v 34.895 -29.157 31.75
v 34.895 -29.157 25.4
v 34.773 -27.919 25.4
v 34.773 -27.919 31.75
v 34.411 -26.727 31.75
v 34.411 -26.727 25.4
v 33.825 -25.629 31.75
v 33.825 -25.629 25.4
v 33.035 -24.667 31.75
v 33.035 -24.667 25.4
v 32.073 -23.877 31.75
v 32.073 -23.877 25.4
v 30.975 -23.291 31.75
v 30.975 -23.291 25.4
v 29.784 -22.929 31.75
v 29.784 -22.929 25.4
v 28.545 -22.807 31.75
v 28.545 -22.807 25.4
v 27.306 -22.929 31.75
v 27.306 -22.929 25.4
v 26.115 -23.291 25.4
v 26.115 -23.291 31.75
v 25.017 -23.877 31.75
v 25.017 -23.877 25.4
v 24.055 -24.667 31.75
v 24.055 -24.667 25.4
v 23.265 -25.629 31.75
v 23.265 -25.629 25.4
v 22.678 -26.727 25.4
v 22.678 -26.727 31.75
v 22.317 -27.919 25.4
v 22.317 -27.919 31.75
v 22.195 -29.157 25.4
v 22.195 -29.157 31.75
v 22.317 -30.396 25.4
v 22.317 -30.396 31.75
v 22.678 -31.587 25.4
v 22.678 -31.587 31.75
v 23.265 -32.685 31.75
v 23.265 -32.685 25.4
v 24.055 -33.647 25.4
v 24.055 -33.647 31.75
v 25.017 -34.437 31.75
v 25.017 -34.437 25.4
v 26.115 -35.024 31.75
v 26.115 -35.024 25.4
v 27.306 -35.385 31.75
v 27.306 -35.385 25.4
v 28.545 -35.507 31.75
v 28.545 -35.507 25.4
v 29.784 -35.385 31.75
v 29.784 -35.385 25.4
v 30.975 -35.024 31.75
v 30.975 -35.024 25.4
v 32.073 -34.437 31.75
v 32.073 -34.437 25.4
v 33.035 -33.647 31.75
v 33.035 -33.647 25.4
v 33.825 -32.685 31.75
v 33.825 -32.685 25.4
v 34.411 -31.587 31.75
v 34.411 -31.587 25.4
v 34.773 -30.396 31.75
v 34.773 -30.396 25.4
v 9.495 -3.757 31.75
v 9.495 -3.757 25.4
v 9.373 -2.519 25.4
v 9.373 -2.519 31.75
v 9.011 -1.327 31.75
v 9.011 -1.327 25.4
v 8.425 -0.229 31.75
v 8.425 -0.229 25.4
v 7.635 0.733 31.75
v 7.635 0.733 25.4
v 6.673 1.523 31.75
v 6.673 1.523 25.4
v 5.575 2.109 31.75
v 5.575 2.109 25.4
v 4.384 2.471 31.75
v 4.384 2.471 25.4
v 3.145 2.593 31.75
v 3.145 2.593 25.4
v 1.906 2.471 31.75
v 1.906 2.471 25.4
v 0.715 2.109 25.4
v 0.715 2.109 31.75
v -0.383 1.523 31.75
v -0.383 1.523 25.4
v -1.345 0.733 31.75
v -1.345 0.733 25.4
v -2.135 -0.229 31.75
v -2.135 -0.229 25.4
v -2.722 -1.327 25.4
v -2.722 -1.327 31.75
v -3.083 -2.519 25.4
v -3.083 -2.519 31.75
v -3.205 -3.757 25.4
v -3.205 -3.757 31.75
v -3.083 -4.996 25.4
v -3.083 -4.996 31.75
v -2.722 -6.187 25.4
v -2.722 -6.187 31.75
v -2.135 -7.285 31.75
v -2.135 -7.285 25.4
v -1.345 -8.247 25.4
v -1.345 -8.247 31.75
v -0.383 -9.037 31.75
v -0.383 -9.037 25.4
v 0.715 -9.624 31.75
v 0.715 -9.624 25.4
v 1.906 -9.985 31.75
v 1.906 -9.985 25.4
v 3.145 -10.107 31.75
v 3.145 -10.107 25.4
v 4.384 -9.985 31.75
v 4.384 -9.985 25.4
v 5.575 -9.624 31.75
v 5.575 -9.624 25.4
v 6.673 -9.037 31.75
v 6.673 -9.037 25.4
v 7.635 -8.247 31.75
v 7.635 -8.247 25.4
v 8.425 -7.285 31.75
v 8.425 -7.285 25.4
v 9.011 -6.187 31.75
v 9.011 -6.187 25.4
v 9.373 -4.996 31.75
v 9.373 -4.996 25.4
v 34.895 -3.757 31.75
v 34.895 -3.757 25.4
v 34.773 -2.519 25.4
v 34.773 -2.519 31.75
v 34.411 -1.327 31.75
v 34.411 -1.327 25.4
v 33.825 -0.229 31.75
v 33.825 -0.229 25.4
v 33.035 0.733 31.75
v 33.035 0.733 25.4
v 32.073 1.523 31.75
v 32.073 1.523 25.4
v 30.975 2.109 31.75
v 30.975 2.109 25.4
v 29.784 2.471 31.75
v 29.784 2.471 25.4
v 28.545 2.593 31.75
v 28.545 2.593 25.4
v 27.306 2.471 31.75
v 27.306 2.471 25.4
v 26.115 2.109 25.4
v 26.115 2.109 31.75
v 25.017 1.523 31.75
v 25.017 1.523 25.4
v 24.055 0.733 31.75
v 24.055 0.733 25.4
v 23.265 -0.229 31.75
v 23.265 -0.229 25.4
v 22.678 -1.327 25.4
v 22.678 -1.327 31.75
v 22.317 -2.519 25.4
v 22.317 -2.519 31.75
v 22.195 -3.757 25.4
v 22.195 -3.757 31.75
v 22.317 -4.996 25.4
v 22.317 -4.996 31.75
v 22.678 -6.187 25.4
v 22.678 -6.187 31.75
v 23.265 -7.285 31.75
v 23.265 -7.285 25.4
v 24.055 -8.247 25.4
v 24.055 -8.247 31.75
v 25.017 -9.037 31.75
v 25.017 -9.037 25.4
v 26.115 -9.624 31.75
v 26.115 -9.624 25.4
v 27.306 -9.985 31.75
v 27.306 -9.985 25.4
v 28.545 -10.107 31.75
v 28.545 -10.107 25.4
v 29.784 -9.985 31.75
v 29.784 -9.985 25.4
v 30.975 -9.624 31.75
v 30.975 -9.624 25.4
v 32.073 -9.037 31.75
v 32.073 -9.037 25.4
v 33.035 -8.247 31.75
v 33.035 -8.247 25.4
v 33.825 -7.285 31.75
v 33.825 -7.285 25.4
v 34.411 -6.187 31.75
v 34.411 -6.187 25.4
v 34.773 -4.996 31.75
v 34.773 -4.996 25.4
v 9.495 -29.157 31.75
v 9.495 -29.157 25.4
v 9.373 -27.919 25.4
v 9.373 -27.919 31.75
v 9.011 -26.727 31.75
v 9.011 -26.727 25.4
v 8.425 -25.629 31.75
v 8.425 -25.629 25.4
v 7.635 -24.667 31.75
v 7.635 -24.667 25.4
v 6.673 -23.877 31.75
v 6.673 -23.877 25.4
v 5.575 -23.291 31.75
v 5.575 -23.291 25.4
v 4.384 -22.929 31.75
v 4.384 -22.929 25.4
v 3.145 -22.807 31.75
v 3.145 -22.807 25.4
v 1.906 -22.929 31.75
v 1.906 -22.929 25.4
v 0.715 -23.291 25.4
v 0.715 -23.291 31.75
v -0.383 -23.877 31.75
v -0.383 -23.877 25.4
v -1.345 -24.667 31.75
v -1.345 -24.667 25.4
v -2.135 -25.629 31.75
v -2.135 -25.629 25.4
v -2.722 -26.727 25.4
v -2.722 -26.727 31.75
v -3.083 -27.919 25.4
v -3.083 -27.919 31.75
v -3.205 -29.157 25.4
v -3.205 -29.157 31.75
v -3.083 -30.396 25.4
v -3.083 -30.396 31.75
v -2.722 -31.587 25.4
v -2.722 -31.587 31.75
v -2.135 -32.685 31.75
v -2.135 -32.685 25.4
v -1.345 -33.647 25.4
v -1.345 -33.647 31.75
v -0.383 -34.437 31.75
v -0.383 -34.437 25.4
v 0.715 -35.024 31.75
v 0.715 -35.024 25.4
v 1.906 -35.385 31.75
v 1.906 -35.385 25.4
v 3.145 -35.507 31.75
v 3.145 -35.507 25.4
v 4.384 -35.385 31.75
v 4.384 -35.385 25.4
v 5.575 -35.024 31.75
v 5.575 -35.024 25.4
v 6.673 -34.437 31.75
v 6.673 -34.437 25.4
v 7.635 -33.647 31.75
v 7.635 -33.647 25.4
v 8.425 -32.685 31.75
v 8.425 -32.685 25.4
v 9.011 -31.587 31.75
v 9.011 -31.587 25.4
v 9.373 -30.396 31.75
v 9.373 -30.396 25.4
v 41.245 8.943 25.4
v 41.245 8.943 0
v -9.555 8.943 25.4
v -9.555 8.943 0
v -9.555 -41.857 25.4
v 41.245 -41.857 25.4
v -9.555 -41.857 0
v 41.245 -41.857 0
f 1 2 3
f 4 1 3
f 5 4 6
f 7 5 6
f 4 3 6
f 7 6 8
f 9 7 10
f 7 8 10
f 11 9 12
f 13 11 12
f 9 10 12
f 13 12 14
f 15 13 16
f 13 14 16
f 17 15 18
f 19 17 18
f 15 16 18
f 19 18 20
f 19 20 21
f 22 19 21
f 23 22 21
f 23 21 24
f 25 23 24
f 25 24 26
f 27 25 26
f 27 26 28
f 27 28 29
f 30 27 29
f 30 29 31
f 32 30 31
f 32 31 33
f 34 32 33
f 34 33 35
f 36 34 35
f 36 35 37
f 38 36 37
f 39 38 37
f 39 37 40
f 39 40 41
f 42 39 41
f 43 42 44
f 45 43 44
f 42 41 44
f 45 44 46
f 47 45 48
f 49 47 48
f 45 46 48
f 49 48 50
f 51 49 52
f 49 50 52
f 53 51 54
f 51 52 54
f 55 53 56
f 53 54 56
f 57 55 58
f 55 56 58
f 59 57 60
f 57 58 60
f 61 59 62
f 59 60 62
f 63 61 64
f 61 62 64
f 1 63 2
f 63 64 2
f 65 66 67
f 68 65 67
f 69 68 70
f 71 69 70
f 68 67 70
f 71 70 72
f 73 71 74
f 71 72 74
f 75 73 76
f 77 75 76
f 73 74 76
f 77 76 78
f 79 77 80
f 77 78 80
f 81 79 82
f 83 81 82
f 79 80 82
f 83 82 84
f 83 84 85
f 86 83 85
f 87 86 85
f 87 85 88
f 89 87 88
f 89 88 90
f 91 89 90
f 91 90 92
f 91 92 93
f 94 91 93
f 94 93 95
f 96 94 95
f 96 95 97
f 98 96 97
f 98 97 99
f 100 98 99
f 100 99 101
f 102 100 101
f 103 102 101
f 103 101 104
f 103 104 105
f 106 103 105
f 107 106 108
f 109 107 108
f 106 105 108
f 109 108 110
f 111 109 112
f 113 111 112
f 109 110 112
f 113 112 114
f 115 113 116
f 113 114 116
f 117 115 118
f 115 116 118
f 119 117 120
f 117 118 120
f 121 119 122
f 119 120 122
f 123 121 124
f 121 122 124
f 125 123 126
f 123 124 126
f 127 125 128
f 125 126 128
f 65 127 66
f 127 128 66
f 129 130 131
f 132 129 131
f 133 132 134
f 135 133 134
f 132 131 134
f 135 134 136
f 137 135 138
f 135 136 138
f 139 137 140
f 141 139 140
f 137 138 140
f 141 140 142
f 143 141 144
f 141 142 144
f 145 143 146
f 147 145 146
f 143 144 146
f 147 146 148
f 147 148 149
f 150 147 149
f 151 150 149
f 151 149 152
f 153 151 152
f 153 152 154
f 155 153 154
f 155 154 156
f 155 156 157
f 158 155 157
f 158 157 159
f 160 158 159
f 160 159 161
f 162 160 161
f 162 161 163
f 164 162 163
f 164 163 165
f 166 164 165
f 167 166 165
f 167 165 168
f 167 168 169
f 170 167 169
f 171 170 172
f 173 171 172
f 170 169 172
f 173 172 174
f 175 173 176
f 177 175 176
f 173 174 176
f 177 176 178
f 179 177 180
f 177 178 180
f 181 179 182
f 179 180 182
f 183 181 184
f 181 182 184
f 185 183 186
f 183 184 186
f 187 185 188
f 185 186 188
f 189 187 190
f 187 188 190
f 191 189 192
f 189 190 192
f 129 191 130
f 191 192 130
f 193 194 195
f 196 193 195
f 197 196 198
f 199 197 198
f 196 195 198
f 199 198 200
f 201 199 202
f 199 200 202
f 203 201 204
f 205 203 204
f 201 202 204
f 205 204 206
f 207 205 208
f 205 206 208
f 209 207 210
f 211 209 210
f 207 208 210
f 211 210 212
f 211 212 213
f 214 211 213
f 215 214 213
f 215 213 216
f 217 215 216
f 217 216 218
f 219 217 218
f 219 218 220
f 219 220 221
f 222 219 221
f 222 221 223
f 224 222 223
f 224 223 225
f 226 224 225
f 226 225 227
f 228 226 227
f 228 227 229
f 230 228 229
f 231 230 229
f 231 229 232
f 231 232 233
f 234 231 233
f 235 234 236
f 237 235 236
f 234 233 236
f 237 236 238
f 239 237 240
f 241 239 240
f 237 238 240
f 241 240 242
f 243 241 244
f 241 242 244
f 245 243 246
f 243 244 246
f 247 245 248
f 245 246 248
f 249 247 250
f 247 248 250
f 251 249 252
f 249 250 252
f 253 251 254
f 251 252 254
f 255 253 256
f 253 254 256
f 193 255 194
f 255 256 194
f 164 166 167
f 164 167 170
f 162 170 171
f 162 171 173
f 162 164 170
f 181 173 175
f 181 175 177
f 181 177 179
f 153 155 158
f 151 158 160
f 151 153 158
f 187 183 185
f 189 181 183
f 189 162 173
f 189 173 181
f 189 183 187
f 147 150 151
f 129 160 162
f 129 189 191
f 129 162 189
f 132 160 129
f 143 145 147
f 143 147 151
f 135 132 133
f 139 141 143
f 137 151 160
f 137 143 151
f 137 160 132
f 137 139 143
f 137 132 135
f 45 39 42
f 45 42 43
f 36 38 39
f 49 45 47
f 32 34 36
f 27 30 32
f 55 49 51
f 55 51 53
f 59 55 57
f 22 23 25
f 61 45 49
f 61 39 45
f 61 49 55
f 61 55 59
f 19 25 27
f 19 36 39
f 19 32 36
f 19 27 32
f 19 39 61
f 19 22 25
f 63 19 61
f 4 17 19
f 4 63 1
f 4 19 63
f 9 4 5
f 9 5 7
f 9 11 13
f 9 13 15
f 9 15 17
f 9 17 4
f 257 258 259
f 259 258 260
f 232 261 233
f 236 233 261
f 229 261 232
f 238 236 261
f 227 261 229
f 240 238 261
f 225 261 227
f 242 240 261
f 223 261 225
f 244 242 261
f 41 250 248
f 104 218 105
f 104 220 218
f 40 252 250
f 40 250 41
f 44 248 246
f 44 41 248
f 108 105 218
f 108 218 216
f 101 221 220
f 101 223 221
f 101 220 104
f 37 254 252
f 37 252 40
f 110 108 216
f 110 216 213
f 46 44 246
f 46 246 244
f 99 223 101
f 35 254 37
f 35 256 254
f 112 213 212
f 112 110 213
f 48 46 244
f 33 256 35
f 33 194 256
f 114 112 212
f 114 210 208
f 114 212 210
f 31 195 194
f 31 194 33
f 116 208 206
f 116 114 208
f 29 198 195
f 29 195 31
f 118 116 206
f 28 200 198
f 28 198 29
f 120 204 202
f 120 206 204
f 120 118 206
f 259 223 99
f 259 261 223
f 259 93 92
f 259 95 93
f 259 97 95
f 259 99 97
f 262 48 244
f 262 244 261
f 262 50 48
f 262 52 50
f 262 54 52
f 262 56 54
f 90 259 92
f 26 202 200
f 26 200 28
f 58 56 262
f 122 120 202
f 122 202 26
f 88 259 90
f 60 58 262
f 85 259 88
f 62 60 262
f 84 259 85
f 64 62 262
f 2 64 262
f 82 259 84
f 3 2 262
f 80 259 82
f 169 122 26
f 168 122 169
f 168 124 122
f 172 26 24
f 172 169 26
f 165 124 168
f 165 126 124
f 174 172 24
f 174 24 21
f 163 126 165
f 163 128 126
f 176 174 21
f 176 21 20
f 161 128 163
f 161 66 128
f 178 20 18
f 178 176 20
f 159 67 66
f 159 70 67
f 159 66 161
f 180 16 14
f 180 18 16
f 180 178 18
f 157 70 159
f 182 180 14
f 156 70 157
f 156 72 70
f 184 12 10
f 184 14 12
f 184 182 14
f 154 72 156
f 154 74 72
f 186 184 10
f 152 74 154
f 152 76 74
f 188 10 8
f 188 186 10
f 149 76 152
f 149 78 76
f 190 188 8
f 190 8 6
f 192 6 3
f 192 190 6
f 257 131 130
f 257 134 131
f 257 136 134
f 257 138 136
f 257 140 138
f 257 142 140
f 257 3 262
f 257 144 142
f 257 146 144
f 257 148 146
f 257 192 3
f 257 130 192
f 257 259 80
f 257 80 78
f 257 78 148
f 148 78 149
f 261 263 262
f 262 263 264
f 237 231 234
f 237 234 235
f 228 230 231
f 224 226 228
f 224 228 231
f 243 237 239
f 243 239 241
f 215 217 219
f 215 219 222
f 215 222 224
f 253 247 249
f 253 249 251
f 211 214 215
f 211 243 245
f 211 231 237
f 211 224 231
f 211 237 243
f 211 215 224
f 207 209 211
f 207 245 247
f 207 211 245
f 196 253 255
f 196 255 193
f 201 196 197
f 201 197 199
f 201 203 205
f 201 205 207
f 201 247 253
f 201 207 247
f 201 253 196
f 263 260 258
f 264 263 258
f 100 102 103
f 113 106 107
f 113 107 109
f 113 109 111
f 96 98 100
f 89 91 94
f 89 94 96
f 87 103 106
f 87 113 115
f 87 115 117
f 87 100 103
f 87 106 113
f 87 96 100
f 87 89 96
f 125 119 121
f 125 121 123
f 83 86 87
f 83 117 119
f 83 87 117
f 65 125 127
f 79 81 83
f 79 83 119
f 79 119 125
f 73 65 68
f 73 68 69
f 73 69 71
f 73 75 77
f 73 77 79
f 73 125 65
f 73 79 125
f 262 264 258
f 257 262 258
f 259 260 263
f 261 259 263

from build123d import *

# Parameters (mm, degrees)
F0_R     = 6.35
F1_DEPTH = 25.4
F2_DEPTH = 31.75


with BuildPart() as f1:
    # F0 (on Top) → F1 (new body)
    with BuildSketch(Plane.XY):
        Polygon((3.144786, 8.942672), (-9.555214, 8.942672), (-9.555214, -3.757328), (-9.555214, -29.157328), (-9.555214, -41.857328), (3.144786, -41.857328), (28.544786, -41.857328), (41.244786, -41.857328), (41.244786, -29.157328), (41.244786, -3.757328), (41.244786, 8.942672), (28.544786, 8.942672), align=None)
        with Locations((3.144786, -29.157328)):
            Circle(F0_R, mode=Mode.SUBTRACT)
        with Locations((28.544786, -29.157328)):
            Circle(F0_R, mode=Mode.SUBTRACT)
        with Locations((3.144786, -3.757328)):
            Circle(F0_R, mode=Mode.SUBTRACT)
        with Locations((28.544786, -3.757328)):
            Circle(F0_R, mode=Mode.SUBTRACT)
    extrude(amount=F1_DEPTH)

    # F0 (on Top) → F2 (join)
    with BuildSketch(Plane.XY):
        with Locations((28.544786, -29.157328)):
            Circle(F0_R)
        with Locations((3.144786, -3.757328)):
            Circle(F0_R)
        with Locations((28.544786, -3.757328)):
            Circle(F0_R)
        with Locations((3.144786, -29.157328)):
            Circle(F0_R)
    extrude(amount=F2_DEPTH)


solid = f1.part
